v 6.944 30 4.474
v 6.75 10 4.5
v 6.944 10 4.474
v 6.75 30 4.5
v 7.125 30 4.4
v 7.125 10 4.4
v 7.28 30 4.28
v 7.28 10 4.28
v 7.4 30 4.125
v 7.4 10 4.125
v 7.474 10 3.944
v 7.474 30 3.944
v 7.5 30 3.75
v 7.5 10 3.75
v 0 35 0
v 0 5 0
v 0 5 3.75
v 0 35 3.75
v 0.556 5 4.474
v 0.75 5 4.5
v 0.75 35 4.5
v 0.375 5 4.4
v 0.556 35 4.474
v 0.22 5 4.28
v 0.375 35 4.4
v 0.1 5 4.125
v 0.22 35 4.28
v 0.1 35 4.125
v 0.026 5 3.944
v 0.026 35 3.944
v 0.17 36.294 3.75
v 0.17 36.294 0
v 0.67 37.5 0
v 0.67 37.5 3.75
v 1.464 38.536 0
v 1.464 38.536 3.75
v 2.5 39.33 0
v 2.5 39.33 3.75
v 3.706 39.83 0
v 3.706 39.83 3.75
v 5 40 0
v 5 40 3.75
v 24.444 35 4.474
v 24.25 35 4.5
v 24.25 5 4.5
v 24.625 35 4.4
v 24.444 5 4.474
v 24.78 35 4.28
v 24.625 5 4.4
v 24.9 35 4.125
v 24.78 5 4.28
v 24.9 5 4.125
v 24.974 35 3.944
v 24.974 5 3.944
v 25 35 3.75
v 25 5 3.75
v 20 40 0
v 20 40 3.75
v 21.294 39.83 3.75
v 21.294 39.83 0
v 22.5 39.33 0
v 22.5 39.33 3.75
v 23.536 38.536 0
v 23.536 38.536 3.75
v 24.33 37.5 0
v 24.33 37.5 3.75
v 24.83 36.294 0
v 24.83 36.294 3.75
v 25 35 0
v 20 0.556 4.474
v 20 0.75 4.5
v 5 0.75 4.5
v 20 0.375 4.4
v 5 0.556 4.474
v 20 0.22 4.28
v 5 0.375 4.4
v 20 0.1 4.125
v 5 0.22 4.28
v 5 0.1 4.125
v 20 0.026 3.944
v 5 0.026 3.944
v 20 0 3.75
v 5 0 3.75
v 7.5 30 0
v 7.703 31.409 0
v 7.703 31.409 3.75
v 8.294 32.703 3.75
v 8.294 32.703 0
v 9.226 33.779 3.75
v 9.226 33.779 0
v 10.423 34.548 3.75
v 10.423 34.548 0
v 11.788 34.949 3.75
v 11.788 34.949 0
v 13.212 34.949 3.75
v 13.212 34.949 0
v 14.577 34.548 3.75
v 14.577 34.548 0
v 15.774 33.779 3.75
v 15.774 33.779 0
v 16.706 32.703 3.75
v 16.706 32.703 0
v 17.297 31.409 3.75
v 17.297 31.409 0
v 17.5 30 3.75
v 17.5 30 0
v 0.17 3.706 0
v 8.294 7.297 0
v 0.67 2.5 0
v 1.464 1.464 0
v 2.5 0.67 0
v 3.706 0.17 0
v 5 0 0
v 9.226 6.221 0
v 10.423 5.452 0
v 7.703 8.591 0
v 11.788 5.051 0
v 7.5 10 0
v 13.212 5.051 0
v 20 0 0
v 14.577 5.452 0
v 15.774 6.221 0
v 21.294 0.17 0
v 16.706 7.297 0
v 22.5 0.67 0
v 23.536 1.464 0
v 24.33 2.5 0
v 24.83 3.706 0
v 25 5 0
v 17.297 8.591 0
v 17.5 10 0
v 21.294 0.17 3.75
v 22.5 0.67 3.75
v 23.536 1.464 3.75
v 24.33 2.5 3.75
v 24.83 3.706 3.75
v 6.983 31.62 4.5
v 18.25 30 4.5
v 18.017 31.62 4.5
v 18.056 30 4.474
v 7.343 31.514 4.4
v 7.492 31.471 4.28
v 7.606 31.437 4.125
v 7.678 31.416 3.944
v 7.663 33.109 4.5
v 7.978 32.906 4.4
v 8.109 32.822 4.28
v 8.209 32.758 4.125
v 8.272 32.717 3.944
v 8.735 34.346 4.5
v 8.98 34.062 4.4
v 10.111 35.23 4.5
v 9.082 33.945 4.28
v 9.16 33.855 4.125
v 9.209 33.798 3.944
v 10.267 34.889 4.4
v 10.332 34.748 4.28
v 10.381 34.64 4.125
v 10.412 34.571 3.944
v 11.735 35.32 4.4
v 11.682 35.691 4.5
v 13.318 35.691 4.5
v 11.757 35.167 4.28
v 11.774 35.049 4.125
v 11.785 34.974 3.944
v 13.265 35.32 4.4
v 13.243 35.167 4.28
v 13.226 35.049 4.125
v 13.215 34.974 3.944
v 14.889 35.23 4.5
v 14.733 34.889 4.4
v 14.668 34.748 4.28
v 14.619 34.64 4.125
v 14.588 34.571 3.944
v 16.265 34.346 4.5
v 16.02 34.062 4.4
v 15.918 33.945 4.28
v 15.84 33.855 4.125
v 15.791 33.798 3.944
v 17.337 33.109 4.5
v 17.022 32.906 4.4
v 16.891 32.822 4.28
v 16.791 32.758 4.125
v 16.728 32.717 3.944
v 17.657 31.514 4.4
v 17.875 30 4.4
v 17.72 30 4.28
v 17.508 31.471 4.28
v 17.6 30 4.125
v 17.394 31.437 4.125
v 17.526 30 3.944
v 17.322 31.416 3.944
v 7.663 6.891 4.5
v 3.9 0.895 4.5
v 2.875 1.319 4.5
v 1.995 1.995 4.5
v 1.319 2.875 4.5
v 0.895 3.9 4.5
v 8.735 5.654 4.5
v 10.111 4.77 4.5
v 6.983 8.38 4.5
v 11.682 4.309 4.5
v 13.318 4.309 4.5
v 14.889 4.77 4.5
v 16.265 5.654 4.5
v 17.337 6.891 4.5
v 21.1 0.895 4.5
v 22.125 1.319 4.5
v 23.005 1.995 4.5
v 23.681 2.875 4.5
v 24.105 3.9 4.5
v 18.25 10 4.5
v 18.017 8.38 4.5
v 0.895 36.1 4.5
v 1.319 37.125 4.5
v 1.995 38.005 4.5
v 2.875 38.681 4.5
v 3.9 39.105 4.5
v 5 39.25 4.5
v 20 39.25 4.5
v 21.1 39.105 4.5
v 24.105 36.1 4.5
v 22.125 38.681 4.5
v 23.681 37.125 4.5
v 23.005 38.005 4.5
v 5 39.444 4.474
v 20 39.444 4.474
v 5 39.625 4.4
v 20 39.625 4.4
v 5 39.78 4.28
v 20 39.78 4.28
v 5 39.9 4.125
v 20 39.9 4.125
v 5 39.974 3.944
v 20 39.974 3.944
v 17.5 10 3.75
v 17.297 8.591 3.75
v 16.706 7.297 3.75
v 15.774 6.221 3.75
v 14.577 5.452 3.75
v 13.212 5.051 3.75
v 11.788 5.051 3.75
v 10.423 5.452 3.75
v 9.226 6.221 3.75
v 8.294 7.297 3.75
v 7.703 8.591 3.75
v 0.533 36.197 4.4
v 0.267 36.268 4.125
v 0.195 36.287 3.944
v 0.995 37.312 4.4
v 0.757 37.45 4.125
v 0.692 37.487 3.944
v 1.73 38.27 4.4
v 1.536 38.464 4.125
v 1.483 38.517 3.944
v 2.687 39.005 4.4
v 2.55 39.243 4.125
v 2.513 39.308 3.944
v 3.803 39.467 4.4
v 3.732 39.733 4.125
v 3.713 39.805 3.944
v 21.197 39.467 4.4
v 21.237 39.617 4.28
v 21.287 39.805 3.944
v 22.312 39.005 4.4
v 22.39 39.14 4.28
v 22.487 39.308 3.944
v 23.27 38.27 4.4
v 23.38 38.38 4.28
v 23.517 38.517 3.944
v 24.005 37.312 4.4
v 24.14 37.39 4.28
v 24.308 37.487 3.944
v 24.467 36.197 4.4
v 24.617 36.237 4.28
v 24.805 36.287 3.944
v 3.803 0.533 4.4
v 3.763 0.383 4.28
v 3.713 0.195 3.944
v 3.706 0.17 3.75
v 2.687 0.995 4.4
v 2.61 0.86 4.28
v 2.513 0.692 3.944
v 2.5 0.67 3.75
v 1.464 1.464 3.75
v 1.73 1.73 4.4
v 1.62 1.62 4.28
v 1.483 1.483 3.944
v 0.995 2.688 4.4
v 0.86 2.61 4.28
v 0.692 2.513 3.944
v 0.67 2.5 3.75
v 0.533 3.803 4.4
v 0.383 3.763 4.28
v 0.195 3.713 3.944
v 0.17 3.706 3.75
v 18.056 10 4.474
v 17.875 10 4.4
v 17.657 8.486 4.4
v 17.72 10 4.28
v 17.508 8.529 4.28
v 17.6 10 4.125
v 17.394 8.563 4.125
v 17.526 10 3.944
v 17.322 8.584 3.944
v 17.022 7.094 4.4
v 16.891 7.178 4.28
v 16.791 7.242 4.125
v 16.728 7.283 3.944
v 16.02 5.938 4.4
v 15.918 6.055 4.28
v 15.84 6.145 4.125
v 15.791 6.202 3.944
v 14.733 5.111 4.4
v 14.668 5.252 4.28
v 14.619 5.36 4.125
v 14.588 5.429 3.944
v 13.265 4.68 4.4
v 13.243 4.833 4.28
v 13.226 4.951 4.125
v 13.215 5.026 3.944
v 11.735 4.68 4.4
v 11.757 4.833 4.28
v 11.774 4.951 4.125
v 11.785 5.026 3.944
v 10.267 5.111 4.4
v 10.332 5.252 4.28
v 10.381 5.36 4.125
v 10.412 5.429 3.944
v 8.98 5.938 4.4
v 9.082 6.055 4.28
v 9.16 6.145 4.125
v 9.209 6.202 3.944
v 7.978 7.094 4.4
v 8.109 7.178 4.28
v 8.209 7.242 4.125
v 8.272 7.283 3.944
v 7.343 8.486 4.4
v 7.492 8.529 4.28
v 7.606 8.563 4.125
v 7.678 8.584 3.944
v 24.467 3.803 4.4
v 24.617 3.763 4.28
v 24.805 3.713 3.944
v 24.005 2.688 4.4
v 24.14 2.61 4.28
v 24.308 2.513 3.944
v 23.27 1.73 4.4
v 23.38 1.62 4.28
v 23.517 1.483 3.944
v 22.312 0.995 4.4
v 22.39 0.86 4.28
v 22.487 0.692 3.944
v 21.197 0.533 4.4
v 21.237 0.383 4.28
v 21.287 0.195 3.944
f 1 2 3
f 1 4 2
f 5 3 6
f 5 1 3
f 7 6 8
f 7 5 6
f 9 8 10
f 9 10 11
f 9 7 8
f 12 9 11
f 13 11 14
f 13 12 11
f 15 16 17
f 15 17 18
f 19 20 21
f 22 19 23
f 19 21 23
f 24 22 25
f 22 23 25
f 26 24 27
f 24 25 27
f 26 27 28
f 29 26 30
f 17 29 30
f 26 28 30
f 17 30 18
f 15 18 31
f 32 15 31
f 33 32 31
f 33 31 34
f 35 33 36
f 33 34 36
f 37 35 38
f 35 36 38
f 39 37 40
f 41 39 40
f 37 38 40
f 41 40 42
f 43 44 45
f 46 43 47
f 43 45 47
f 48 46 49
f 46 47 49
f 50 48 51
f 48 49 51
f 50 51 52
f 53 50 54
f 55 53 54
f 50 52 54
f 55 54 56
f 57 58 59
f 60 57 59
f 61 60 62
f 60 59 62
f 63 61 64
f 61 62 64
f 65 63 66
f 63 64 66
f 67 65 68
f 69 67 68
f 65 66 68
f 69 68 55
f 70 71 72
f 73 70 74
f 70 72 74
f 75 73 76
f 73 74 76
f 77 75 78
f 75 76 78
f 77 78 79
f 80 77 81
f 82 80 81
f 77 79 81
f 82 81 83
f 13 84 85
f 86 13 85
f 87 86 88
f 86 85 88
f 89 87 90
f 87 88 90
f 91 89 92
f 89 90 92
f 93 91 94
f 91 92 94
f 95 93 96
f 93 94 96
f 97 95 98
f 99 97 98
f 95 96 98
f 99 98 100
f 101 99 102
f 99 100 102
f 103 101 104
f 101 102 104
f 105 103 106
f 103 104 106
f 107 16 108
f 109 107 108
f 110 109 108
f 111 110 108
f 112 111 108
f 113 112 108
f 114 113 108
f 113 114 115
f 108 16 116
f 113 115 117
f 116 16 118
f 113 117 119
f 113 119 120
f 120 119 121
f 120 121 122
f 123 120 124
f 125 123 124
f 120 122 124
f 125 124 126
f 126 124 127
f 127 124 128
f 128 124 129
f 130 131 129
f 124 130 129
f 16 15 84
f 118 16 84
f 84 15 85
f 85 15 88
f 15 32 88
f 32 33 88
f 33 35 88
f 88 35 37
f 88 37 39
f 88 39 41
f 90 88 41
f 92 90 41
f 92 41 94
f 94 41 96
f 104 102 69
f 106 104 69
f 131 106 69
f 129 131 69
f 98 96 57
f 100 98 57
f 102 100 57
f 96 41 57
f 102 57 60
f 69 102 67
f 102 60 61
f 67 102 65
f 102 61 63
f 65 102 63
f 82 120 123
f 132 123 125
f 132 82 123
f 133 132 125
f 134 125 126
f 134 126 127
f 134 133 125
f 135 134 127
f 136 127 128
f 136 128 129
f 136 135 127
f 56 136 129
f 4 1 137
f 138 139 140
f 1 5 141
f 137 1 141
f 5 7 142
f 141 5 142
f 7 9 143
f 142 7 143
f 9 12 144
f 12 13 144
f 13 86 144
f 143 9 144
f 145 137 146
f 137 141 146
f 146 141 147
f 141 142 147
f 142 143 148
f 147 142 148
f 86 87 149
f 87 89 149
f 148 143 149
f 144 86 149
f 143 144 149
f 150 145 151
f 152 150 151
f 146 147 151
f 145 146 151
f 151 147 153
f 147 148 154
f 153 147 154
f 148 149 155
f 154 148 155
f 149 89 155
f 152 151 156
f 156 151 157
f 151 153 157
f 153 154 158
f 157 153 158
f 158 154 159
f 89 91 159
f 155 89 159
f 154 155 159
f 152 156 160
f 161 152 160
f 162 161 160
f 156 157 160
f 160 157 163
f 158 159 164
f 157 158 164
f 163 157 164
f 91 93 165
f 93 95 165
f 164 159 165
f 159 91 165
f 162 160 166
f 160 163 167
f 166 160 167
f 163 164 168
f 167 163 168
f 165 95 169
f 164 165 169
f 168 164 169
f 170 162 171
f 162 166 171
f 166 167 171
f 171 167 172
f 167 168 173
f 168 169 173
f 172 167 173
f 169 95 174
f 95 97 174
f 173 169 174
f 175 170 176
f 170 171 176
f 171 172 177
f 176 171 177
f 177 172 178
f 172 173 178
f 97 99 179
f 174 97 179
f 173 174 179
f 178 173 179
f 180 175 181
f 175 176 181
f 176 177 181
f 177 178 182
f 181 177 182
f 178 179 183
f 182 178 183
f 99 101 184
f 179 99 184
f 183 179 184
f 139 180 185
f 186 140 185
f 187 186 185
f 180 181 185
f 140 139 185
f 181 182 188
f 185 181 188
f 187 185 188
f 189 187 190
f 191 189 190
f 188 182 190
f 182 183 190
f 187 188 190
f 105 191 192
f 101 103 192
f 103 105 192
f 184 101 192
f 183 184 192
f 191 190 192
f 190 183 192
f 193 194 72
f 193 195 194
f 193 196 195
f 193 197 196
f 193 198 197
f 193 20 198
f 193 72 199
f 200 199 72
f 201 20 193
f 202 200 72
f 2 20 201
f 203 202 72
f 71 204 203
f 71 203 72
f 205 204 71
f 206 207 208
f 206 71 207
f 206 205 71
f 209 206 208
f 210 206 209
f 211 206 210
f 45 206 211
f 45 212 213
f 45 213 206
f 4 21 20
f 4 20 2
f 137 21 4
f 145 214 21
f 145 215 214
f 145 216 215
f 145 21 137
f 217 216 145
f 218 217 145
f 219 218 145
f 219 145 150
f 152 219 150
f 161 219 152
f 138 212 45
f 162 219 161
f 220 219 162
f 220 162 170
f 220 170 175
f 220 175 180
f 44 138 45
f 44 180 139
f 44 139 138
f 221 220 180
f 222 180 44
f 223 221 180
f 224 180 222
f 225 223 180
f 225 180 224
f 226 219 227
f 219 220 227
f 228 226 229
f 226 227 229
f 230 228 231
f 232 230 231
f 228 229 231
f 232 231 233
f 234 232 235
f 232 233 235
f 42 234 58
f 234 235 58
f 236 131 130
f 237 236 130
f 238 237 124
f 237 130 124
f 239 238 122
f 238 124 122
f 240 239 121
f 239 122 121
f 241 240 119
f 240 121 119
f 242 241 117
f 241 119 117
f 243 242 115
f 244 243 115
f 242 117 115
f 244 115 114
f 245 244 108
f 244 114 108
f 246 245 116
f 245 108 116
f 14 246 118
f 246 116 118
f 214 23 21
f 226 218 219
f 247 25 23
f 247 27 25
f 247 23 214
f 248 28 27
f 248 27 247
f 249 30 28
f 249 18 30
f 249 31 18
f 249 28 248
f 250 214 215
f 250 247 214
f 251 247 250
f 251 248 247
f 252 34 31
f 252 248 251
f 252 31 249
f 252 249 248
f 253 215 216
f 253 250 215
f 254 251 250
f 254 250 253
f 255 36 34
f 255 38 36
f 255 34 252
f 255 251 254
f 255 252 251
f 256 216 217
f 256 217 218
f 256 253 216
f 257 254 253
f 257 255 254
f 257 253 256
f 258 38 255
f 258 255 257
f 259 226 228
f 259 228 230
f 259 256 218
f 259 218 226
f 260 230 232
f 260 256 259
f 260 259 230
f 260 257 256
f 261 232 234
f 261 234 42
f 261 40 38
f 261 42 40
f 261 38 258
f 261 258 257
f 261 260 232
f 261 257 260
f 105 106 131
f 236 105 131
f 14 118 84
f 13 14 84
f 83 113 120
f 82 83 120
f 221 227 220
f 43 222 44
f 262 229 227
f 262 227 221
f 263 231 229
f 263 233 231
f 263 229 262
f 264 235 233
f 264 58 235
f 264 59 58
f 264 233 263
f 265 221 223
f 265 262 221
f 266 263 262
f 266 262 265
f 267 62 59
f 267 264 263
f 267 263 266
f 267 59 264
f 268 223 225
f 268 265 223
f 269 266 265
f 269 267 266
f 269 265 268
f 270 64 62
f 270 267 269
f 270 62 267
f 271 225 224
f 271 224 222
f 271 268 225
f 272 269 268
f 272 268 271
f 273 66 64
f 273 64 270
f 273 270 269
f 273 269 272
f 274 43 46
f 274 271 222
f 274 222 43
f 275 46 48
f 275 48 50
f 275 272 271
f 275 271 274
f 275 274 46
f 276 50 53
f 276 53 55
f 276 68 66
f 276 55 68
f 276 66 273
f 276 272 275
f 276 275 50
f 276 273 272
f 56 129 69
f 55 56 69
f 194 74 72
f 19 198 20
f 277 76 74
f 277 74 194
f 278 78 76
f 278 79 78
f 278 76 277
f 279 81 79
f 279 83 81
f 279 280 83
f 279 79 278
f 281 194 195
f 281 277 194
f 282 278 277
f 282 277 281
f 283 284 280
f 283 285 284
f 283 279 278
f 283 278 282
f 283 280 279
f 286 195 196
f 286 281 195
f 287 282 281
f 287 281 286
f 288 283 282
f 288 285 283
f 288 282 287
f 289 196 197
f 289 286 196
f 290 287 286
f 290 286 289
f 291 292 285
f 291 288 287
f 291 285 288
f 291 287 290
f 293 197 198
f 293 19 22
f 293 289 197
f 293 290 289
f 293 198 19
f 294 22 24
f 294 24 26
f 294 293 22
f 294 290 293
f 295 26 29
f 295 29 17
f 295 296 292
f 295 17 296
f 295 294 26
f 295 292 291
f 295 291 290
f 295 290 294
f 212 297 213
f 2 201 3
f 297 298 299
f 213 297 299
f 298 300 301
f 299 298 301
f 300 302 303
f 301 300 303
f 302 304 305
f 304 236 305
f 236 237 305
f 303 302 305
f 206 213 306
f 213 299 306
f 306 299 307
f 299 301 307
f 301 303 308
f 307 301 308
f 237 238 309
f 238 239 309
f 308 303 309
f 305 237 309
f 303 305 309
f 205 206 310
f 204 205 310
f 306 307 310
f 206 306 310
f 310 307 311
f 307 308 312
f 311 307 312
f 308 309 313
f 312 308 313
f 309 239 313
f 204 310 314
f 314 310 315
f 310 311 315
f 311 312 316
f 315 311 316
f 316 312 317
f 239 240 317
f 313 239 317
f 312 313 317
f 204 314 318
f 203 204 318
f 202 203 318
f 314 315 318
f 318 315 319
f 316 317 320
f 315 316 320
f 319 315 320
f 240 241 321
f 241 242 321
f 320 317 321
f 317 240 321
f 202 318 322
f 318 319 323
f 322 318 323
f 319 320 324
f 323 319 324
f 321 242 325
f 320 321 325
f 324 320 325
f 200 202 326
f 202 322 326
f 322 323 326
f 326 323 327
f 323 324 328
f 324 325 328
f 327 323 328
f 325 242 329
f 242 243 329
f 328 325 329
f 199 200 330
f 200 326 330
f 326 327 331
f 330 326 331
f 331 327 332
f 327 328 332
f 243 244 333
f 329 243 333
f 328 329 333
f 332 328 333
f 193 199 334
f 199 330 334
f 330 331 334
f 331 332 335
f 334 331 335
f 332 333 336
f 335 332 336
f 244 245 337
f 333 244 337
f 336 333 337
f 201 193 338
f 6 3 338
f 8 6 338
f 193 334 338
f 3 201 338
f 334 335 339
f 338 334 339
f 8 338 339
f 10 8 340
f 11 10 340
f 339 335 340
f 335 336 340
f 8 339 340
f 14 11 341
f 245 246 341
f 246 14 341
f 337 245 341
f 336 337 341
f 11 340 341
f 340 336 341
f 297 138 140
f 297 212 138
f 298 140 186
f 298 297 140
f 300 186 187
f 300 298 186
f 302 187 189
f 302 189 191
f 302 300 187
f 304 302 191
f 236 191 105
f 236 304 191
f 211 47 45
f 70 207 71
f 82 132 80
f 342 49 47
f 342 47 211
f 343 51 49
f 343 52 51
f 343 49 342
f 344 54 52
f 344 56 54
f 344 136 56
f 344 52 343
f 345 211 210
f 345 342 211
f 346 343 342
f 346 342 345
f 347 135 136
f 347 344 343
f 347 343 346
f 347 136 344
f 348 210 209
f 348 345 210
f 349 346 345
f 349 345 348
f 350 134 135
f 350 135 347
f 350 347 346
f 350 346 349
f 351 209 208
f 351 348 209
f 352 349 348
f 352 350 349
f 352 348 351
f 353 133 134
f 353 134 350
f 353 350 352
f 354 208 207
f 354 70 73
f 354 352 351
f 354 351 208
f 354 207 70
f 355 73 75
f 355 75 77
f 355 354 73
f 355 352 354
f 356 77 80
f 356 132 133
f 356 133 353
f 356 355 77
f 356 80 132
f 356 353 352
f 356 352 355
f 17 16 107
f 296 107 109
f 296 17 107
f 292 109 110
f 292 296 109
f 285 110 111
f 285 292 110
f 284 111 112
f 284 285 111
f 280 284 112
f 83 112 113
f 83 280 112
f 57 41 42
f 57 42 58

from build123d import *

# Parameters (mm, degrees)
SKETCH1_W           = 25
SKETCH1_H           = 40
BOSS_EXTRUDE1_DEPTH = 4.5
FILLET1_R           = 5
FILLET2_R           = 0.75


with BuildPart() as part:
    # Sketch1 → Boss-Extrude1 (new body)
    with BuildSketch(Plane.XY):
        with Locations((12.5, 20)):
            Rectangle(SKETCH1_W, SKETCH1_H)
        with BuildLine():
            Line((17.5, 30), (17.5, 10))
            ThreePointArc((17.5, 10), (12.5, 5), (7.5, 10))
            Line((7.5, 10), (7.5, 30))
            ThreePointArc((7.5, 30), (12.5, 35), (17.5, 30))
        make_face(mode=Mode.SUBTRACT)
    extrude(amount=BOSS_EXTRUDE1_DEPTH)

    # Fillet1
    fillet1_edges = [part.edges().sort_by_distance(p)[0] for p in [
        (0, 40, 2.25),
        (25, 40, 2.25),
        (25, 0, 2.25),
        (0, 0, 2.25),
    ]]
    fillet(fillet1_edges, radius=FILLET1_R)

    # Fillet2
    fillet2_edges = [part.edges().sort_by_distance(p)[0] for p in [
        (12.5, 35, 4.5),
        (7.5, 20, 4.5),
        (12.5, 5, 4.5),
        (17.5, 20, 4.5),
        (12.5, 40, 4.5),
        (25, 20, 4.5),
        (0, 20, 4.5),
        (12.5, 0, 4.5),
        (1.464466094, 38.535533906, 4.5),
        (1.464466094, 1.464466094, 4.5),
        (23.535533906, 1.464466094, 4.5),
        (23.535533906, 38.535533906, 4.5),
    ]]
    fillet(fillet2_edges, radius=FILLET2_R)


solid = part.part
